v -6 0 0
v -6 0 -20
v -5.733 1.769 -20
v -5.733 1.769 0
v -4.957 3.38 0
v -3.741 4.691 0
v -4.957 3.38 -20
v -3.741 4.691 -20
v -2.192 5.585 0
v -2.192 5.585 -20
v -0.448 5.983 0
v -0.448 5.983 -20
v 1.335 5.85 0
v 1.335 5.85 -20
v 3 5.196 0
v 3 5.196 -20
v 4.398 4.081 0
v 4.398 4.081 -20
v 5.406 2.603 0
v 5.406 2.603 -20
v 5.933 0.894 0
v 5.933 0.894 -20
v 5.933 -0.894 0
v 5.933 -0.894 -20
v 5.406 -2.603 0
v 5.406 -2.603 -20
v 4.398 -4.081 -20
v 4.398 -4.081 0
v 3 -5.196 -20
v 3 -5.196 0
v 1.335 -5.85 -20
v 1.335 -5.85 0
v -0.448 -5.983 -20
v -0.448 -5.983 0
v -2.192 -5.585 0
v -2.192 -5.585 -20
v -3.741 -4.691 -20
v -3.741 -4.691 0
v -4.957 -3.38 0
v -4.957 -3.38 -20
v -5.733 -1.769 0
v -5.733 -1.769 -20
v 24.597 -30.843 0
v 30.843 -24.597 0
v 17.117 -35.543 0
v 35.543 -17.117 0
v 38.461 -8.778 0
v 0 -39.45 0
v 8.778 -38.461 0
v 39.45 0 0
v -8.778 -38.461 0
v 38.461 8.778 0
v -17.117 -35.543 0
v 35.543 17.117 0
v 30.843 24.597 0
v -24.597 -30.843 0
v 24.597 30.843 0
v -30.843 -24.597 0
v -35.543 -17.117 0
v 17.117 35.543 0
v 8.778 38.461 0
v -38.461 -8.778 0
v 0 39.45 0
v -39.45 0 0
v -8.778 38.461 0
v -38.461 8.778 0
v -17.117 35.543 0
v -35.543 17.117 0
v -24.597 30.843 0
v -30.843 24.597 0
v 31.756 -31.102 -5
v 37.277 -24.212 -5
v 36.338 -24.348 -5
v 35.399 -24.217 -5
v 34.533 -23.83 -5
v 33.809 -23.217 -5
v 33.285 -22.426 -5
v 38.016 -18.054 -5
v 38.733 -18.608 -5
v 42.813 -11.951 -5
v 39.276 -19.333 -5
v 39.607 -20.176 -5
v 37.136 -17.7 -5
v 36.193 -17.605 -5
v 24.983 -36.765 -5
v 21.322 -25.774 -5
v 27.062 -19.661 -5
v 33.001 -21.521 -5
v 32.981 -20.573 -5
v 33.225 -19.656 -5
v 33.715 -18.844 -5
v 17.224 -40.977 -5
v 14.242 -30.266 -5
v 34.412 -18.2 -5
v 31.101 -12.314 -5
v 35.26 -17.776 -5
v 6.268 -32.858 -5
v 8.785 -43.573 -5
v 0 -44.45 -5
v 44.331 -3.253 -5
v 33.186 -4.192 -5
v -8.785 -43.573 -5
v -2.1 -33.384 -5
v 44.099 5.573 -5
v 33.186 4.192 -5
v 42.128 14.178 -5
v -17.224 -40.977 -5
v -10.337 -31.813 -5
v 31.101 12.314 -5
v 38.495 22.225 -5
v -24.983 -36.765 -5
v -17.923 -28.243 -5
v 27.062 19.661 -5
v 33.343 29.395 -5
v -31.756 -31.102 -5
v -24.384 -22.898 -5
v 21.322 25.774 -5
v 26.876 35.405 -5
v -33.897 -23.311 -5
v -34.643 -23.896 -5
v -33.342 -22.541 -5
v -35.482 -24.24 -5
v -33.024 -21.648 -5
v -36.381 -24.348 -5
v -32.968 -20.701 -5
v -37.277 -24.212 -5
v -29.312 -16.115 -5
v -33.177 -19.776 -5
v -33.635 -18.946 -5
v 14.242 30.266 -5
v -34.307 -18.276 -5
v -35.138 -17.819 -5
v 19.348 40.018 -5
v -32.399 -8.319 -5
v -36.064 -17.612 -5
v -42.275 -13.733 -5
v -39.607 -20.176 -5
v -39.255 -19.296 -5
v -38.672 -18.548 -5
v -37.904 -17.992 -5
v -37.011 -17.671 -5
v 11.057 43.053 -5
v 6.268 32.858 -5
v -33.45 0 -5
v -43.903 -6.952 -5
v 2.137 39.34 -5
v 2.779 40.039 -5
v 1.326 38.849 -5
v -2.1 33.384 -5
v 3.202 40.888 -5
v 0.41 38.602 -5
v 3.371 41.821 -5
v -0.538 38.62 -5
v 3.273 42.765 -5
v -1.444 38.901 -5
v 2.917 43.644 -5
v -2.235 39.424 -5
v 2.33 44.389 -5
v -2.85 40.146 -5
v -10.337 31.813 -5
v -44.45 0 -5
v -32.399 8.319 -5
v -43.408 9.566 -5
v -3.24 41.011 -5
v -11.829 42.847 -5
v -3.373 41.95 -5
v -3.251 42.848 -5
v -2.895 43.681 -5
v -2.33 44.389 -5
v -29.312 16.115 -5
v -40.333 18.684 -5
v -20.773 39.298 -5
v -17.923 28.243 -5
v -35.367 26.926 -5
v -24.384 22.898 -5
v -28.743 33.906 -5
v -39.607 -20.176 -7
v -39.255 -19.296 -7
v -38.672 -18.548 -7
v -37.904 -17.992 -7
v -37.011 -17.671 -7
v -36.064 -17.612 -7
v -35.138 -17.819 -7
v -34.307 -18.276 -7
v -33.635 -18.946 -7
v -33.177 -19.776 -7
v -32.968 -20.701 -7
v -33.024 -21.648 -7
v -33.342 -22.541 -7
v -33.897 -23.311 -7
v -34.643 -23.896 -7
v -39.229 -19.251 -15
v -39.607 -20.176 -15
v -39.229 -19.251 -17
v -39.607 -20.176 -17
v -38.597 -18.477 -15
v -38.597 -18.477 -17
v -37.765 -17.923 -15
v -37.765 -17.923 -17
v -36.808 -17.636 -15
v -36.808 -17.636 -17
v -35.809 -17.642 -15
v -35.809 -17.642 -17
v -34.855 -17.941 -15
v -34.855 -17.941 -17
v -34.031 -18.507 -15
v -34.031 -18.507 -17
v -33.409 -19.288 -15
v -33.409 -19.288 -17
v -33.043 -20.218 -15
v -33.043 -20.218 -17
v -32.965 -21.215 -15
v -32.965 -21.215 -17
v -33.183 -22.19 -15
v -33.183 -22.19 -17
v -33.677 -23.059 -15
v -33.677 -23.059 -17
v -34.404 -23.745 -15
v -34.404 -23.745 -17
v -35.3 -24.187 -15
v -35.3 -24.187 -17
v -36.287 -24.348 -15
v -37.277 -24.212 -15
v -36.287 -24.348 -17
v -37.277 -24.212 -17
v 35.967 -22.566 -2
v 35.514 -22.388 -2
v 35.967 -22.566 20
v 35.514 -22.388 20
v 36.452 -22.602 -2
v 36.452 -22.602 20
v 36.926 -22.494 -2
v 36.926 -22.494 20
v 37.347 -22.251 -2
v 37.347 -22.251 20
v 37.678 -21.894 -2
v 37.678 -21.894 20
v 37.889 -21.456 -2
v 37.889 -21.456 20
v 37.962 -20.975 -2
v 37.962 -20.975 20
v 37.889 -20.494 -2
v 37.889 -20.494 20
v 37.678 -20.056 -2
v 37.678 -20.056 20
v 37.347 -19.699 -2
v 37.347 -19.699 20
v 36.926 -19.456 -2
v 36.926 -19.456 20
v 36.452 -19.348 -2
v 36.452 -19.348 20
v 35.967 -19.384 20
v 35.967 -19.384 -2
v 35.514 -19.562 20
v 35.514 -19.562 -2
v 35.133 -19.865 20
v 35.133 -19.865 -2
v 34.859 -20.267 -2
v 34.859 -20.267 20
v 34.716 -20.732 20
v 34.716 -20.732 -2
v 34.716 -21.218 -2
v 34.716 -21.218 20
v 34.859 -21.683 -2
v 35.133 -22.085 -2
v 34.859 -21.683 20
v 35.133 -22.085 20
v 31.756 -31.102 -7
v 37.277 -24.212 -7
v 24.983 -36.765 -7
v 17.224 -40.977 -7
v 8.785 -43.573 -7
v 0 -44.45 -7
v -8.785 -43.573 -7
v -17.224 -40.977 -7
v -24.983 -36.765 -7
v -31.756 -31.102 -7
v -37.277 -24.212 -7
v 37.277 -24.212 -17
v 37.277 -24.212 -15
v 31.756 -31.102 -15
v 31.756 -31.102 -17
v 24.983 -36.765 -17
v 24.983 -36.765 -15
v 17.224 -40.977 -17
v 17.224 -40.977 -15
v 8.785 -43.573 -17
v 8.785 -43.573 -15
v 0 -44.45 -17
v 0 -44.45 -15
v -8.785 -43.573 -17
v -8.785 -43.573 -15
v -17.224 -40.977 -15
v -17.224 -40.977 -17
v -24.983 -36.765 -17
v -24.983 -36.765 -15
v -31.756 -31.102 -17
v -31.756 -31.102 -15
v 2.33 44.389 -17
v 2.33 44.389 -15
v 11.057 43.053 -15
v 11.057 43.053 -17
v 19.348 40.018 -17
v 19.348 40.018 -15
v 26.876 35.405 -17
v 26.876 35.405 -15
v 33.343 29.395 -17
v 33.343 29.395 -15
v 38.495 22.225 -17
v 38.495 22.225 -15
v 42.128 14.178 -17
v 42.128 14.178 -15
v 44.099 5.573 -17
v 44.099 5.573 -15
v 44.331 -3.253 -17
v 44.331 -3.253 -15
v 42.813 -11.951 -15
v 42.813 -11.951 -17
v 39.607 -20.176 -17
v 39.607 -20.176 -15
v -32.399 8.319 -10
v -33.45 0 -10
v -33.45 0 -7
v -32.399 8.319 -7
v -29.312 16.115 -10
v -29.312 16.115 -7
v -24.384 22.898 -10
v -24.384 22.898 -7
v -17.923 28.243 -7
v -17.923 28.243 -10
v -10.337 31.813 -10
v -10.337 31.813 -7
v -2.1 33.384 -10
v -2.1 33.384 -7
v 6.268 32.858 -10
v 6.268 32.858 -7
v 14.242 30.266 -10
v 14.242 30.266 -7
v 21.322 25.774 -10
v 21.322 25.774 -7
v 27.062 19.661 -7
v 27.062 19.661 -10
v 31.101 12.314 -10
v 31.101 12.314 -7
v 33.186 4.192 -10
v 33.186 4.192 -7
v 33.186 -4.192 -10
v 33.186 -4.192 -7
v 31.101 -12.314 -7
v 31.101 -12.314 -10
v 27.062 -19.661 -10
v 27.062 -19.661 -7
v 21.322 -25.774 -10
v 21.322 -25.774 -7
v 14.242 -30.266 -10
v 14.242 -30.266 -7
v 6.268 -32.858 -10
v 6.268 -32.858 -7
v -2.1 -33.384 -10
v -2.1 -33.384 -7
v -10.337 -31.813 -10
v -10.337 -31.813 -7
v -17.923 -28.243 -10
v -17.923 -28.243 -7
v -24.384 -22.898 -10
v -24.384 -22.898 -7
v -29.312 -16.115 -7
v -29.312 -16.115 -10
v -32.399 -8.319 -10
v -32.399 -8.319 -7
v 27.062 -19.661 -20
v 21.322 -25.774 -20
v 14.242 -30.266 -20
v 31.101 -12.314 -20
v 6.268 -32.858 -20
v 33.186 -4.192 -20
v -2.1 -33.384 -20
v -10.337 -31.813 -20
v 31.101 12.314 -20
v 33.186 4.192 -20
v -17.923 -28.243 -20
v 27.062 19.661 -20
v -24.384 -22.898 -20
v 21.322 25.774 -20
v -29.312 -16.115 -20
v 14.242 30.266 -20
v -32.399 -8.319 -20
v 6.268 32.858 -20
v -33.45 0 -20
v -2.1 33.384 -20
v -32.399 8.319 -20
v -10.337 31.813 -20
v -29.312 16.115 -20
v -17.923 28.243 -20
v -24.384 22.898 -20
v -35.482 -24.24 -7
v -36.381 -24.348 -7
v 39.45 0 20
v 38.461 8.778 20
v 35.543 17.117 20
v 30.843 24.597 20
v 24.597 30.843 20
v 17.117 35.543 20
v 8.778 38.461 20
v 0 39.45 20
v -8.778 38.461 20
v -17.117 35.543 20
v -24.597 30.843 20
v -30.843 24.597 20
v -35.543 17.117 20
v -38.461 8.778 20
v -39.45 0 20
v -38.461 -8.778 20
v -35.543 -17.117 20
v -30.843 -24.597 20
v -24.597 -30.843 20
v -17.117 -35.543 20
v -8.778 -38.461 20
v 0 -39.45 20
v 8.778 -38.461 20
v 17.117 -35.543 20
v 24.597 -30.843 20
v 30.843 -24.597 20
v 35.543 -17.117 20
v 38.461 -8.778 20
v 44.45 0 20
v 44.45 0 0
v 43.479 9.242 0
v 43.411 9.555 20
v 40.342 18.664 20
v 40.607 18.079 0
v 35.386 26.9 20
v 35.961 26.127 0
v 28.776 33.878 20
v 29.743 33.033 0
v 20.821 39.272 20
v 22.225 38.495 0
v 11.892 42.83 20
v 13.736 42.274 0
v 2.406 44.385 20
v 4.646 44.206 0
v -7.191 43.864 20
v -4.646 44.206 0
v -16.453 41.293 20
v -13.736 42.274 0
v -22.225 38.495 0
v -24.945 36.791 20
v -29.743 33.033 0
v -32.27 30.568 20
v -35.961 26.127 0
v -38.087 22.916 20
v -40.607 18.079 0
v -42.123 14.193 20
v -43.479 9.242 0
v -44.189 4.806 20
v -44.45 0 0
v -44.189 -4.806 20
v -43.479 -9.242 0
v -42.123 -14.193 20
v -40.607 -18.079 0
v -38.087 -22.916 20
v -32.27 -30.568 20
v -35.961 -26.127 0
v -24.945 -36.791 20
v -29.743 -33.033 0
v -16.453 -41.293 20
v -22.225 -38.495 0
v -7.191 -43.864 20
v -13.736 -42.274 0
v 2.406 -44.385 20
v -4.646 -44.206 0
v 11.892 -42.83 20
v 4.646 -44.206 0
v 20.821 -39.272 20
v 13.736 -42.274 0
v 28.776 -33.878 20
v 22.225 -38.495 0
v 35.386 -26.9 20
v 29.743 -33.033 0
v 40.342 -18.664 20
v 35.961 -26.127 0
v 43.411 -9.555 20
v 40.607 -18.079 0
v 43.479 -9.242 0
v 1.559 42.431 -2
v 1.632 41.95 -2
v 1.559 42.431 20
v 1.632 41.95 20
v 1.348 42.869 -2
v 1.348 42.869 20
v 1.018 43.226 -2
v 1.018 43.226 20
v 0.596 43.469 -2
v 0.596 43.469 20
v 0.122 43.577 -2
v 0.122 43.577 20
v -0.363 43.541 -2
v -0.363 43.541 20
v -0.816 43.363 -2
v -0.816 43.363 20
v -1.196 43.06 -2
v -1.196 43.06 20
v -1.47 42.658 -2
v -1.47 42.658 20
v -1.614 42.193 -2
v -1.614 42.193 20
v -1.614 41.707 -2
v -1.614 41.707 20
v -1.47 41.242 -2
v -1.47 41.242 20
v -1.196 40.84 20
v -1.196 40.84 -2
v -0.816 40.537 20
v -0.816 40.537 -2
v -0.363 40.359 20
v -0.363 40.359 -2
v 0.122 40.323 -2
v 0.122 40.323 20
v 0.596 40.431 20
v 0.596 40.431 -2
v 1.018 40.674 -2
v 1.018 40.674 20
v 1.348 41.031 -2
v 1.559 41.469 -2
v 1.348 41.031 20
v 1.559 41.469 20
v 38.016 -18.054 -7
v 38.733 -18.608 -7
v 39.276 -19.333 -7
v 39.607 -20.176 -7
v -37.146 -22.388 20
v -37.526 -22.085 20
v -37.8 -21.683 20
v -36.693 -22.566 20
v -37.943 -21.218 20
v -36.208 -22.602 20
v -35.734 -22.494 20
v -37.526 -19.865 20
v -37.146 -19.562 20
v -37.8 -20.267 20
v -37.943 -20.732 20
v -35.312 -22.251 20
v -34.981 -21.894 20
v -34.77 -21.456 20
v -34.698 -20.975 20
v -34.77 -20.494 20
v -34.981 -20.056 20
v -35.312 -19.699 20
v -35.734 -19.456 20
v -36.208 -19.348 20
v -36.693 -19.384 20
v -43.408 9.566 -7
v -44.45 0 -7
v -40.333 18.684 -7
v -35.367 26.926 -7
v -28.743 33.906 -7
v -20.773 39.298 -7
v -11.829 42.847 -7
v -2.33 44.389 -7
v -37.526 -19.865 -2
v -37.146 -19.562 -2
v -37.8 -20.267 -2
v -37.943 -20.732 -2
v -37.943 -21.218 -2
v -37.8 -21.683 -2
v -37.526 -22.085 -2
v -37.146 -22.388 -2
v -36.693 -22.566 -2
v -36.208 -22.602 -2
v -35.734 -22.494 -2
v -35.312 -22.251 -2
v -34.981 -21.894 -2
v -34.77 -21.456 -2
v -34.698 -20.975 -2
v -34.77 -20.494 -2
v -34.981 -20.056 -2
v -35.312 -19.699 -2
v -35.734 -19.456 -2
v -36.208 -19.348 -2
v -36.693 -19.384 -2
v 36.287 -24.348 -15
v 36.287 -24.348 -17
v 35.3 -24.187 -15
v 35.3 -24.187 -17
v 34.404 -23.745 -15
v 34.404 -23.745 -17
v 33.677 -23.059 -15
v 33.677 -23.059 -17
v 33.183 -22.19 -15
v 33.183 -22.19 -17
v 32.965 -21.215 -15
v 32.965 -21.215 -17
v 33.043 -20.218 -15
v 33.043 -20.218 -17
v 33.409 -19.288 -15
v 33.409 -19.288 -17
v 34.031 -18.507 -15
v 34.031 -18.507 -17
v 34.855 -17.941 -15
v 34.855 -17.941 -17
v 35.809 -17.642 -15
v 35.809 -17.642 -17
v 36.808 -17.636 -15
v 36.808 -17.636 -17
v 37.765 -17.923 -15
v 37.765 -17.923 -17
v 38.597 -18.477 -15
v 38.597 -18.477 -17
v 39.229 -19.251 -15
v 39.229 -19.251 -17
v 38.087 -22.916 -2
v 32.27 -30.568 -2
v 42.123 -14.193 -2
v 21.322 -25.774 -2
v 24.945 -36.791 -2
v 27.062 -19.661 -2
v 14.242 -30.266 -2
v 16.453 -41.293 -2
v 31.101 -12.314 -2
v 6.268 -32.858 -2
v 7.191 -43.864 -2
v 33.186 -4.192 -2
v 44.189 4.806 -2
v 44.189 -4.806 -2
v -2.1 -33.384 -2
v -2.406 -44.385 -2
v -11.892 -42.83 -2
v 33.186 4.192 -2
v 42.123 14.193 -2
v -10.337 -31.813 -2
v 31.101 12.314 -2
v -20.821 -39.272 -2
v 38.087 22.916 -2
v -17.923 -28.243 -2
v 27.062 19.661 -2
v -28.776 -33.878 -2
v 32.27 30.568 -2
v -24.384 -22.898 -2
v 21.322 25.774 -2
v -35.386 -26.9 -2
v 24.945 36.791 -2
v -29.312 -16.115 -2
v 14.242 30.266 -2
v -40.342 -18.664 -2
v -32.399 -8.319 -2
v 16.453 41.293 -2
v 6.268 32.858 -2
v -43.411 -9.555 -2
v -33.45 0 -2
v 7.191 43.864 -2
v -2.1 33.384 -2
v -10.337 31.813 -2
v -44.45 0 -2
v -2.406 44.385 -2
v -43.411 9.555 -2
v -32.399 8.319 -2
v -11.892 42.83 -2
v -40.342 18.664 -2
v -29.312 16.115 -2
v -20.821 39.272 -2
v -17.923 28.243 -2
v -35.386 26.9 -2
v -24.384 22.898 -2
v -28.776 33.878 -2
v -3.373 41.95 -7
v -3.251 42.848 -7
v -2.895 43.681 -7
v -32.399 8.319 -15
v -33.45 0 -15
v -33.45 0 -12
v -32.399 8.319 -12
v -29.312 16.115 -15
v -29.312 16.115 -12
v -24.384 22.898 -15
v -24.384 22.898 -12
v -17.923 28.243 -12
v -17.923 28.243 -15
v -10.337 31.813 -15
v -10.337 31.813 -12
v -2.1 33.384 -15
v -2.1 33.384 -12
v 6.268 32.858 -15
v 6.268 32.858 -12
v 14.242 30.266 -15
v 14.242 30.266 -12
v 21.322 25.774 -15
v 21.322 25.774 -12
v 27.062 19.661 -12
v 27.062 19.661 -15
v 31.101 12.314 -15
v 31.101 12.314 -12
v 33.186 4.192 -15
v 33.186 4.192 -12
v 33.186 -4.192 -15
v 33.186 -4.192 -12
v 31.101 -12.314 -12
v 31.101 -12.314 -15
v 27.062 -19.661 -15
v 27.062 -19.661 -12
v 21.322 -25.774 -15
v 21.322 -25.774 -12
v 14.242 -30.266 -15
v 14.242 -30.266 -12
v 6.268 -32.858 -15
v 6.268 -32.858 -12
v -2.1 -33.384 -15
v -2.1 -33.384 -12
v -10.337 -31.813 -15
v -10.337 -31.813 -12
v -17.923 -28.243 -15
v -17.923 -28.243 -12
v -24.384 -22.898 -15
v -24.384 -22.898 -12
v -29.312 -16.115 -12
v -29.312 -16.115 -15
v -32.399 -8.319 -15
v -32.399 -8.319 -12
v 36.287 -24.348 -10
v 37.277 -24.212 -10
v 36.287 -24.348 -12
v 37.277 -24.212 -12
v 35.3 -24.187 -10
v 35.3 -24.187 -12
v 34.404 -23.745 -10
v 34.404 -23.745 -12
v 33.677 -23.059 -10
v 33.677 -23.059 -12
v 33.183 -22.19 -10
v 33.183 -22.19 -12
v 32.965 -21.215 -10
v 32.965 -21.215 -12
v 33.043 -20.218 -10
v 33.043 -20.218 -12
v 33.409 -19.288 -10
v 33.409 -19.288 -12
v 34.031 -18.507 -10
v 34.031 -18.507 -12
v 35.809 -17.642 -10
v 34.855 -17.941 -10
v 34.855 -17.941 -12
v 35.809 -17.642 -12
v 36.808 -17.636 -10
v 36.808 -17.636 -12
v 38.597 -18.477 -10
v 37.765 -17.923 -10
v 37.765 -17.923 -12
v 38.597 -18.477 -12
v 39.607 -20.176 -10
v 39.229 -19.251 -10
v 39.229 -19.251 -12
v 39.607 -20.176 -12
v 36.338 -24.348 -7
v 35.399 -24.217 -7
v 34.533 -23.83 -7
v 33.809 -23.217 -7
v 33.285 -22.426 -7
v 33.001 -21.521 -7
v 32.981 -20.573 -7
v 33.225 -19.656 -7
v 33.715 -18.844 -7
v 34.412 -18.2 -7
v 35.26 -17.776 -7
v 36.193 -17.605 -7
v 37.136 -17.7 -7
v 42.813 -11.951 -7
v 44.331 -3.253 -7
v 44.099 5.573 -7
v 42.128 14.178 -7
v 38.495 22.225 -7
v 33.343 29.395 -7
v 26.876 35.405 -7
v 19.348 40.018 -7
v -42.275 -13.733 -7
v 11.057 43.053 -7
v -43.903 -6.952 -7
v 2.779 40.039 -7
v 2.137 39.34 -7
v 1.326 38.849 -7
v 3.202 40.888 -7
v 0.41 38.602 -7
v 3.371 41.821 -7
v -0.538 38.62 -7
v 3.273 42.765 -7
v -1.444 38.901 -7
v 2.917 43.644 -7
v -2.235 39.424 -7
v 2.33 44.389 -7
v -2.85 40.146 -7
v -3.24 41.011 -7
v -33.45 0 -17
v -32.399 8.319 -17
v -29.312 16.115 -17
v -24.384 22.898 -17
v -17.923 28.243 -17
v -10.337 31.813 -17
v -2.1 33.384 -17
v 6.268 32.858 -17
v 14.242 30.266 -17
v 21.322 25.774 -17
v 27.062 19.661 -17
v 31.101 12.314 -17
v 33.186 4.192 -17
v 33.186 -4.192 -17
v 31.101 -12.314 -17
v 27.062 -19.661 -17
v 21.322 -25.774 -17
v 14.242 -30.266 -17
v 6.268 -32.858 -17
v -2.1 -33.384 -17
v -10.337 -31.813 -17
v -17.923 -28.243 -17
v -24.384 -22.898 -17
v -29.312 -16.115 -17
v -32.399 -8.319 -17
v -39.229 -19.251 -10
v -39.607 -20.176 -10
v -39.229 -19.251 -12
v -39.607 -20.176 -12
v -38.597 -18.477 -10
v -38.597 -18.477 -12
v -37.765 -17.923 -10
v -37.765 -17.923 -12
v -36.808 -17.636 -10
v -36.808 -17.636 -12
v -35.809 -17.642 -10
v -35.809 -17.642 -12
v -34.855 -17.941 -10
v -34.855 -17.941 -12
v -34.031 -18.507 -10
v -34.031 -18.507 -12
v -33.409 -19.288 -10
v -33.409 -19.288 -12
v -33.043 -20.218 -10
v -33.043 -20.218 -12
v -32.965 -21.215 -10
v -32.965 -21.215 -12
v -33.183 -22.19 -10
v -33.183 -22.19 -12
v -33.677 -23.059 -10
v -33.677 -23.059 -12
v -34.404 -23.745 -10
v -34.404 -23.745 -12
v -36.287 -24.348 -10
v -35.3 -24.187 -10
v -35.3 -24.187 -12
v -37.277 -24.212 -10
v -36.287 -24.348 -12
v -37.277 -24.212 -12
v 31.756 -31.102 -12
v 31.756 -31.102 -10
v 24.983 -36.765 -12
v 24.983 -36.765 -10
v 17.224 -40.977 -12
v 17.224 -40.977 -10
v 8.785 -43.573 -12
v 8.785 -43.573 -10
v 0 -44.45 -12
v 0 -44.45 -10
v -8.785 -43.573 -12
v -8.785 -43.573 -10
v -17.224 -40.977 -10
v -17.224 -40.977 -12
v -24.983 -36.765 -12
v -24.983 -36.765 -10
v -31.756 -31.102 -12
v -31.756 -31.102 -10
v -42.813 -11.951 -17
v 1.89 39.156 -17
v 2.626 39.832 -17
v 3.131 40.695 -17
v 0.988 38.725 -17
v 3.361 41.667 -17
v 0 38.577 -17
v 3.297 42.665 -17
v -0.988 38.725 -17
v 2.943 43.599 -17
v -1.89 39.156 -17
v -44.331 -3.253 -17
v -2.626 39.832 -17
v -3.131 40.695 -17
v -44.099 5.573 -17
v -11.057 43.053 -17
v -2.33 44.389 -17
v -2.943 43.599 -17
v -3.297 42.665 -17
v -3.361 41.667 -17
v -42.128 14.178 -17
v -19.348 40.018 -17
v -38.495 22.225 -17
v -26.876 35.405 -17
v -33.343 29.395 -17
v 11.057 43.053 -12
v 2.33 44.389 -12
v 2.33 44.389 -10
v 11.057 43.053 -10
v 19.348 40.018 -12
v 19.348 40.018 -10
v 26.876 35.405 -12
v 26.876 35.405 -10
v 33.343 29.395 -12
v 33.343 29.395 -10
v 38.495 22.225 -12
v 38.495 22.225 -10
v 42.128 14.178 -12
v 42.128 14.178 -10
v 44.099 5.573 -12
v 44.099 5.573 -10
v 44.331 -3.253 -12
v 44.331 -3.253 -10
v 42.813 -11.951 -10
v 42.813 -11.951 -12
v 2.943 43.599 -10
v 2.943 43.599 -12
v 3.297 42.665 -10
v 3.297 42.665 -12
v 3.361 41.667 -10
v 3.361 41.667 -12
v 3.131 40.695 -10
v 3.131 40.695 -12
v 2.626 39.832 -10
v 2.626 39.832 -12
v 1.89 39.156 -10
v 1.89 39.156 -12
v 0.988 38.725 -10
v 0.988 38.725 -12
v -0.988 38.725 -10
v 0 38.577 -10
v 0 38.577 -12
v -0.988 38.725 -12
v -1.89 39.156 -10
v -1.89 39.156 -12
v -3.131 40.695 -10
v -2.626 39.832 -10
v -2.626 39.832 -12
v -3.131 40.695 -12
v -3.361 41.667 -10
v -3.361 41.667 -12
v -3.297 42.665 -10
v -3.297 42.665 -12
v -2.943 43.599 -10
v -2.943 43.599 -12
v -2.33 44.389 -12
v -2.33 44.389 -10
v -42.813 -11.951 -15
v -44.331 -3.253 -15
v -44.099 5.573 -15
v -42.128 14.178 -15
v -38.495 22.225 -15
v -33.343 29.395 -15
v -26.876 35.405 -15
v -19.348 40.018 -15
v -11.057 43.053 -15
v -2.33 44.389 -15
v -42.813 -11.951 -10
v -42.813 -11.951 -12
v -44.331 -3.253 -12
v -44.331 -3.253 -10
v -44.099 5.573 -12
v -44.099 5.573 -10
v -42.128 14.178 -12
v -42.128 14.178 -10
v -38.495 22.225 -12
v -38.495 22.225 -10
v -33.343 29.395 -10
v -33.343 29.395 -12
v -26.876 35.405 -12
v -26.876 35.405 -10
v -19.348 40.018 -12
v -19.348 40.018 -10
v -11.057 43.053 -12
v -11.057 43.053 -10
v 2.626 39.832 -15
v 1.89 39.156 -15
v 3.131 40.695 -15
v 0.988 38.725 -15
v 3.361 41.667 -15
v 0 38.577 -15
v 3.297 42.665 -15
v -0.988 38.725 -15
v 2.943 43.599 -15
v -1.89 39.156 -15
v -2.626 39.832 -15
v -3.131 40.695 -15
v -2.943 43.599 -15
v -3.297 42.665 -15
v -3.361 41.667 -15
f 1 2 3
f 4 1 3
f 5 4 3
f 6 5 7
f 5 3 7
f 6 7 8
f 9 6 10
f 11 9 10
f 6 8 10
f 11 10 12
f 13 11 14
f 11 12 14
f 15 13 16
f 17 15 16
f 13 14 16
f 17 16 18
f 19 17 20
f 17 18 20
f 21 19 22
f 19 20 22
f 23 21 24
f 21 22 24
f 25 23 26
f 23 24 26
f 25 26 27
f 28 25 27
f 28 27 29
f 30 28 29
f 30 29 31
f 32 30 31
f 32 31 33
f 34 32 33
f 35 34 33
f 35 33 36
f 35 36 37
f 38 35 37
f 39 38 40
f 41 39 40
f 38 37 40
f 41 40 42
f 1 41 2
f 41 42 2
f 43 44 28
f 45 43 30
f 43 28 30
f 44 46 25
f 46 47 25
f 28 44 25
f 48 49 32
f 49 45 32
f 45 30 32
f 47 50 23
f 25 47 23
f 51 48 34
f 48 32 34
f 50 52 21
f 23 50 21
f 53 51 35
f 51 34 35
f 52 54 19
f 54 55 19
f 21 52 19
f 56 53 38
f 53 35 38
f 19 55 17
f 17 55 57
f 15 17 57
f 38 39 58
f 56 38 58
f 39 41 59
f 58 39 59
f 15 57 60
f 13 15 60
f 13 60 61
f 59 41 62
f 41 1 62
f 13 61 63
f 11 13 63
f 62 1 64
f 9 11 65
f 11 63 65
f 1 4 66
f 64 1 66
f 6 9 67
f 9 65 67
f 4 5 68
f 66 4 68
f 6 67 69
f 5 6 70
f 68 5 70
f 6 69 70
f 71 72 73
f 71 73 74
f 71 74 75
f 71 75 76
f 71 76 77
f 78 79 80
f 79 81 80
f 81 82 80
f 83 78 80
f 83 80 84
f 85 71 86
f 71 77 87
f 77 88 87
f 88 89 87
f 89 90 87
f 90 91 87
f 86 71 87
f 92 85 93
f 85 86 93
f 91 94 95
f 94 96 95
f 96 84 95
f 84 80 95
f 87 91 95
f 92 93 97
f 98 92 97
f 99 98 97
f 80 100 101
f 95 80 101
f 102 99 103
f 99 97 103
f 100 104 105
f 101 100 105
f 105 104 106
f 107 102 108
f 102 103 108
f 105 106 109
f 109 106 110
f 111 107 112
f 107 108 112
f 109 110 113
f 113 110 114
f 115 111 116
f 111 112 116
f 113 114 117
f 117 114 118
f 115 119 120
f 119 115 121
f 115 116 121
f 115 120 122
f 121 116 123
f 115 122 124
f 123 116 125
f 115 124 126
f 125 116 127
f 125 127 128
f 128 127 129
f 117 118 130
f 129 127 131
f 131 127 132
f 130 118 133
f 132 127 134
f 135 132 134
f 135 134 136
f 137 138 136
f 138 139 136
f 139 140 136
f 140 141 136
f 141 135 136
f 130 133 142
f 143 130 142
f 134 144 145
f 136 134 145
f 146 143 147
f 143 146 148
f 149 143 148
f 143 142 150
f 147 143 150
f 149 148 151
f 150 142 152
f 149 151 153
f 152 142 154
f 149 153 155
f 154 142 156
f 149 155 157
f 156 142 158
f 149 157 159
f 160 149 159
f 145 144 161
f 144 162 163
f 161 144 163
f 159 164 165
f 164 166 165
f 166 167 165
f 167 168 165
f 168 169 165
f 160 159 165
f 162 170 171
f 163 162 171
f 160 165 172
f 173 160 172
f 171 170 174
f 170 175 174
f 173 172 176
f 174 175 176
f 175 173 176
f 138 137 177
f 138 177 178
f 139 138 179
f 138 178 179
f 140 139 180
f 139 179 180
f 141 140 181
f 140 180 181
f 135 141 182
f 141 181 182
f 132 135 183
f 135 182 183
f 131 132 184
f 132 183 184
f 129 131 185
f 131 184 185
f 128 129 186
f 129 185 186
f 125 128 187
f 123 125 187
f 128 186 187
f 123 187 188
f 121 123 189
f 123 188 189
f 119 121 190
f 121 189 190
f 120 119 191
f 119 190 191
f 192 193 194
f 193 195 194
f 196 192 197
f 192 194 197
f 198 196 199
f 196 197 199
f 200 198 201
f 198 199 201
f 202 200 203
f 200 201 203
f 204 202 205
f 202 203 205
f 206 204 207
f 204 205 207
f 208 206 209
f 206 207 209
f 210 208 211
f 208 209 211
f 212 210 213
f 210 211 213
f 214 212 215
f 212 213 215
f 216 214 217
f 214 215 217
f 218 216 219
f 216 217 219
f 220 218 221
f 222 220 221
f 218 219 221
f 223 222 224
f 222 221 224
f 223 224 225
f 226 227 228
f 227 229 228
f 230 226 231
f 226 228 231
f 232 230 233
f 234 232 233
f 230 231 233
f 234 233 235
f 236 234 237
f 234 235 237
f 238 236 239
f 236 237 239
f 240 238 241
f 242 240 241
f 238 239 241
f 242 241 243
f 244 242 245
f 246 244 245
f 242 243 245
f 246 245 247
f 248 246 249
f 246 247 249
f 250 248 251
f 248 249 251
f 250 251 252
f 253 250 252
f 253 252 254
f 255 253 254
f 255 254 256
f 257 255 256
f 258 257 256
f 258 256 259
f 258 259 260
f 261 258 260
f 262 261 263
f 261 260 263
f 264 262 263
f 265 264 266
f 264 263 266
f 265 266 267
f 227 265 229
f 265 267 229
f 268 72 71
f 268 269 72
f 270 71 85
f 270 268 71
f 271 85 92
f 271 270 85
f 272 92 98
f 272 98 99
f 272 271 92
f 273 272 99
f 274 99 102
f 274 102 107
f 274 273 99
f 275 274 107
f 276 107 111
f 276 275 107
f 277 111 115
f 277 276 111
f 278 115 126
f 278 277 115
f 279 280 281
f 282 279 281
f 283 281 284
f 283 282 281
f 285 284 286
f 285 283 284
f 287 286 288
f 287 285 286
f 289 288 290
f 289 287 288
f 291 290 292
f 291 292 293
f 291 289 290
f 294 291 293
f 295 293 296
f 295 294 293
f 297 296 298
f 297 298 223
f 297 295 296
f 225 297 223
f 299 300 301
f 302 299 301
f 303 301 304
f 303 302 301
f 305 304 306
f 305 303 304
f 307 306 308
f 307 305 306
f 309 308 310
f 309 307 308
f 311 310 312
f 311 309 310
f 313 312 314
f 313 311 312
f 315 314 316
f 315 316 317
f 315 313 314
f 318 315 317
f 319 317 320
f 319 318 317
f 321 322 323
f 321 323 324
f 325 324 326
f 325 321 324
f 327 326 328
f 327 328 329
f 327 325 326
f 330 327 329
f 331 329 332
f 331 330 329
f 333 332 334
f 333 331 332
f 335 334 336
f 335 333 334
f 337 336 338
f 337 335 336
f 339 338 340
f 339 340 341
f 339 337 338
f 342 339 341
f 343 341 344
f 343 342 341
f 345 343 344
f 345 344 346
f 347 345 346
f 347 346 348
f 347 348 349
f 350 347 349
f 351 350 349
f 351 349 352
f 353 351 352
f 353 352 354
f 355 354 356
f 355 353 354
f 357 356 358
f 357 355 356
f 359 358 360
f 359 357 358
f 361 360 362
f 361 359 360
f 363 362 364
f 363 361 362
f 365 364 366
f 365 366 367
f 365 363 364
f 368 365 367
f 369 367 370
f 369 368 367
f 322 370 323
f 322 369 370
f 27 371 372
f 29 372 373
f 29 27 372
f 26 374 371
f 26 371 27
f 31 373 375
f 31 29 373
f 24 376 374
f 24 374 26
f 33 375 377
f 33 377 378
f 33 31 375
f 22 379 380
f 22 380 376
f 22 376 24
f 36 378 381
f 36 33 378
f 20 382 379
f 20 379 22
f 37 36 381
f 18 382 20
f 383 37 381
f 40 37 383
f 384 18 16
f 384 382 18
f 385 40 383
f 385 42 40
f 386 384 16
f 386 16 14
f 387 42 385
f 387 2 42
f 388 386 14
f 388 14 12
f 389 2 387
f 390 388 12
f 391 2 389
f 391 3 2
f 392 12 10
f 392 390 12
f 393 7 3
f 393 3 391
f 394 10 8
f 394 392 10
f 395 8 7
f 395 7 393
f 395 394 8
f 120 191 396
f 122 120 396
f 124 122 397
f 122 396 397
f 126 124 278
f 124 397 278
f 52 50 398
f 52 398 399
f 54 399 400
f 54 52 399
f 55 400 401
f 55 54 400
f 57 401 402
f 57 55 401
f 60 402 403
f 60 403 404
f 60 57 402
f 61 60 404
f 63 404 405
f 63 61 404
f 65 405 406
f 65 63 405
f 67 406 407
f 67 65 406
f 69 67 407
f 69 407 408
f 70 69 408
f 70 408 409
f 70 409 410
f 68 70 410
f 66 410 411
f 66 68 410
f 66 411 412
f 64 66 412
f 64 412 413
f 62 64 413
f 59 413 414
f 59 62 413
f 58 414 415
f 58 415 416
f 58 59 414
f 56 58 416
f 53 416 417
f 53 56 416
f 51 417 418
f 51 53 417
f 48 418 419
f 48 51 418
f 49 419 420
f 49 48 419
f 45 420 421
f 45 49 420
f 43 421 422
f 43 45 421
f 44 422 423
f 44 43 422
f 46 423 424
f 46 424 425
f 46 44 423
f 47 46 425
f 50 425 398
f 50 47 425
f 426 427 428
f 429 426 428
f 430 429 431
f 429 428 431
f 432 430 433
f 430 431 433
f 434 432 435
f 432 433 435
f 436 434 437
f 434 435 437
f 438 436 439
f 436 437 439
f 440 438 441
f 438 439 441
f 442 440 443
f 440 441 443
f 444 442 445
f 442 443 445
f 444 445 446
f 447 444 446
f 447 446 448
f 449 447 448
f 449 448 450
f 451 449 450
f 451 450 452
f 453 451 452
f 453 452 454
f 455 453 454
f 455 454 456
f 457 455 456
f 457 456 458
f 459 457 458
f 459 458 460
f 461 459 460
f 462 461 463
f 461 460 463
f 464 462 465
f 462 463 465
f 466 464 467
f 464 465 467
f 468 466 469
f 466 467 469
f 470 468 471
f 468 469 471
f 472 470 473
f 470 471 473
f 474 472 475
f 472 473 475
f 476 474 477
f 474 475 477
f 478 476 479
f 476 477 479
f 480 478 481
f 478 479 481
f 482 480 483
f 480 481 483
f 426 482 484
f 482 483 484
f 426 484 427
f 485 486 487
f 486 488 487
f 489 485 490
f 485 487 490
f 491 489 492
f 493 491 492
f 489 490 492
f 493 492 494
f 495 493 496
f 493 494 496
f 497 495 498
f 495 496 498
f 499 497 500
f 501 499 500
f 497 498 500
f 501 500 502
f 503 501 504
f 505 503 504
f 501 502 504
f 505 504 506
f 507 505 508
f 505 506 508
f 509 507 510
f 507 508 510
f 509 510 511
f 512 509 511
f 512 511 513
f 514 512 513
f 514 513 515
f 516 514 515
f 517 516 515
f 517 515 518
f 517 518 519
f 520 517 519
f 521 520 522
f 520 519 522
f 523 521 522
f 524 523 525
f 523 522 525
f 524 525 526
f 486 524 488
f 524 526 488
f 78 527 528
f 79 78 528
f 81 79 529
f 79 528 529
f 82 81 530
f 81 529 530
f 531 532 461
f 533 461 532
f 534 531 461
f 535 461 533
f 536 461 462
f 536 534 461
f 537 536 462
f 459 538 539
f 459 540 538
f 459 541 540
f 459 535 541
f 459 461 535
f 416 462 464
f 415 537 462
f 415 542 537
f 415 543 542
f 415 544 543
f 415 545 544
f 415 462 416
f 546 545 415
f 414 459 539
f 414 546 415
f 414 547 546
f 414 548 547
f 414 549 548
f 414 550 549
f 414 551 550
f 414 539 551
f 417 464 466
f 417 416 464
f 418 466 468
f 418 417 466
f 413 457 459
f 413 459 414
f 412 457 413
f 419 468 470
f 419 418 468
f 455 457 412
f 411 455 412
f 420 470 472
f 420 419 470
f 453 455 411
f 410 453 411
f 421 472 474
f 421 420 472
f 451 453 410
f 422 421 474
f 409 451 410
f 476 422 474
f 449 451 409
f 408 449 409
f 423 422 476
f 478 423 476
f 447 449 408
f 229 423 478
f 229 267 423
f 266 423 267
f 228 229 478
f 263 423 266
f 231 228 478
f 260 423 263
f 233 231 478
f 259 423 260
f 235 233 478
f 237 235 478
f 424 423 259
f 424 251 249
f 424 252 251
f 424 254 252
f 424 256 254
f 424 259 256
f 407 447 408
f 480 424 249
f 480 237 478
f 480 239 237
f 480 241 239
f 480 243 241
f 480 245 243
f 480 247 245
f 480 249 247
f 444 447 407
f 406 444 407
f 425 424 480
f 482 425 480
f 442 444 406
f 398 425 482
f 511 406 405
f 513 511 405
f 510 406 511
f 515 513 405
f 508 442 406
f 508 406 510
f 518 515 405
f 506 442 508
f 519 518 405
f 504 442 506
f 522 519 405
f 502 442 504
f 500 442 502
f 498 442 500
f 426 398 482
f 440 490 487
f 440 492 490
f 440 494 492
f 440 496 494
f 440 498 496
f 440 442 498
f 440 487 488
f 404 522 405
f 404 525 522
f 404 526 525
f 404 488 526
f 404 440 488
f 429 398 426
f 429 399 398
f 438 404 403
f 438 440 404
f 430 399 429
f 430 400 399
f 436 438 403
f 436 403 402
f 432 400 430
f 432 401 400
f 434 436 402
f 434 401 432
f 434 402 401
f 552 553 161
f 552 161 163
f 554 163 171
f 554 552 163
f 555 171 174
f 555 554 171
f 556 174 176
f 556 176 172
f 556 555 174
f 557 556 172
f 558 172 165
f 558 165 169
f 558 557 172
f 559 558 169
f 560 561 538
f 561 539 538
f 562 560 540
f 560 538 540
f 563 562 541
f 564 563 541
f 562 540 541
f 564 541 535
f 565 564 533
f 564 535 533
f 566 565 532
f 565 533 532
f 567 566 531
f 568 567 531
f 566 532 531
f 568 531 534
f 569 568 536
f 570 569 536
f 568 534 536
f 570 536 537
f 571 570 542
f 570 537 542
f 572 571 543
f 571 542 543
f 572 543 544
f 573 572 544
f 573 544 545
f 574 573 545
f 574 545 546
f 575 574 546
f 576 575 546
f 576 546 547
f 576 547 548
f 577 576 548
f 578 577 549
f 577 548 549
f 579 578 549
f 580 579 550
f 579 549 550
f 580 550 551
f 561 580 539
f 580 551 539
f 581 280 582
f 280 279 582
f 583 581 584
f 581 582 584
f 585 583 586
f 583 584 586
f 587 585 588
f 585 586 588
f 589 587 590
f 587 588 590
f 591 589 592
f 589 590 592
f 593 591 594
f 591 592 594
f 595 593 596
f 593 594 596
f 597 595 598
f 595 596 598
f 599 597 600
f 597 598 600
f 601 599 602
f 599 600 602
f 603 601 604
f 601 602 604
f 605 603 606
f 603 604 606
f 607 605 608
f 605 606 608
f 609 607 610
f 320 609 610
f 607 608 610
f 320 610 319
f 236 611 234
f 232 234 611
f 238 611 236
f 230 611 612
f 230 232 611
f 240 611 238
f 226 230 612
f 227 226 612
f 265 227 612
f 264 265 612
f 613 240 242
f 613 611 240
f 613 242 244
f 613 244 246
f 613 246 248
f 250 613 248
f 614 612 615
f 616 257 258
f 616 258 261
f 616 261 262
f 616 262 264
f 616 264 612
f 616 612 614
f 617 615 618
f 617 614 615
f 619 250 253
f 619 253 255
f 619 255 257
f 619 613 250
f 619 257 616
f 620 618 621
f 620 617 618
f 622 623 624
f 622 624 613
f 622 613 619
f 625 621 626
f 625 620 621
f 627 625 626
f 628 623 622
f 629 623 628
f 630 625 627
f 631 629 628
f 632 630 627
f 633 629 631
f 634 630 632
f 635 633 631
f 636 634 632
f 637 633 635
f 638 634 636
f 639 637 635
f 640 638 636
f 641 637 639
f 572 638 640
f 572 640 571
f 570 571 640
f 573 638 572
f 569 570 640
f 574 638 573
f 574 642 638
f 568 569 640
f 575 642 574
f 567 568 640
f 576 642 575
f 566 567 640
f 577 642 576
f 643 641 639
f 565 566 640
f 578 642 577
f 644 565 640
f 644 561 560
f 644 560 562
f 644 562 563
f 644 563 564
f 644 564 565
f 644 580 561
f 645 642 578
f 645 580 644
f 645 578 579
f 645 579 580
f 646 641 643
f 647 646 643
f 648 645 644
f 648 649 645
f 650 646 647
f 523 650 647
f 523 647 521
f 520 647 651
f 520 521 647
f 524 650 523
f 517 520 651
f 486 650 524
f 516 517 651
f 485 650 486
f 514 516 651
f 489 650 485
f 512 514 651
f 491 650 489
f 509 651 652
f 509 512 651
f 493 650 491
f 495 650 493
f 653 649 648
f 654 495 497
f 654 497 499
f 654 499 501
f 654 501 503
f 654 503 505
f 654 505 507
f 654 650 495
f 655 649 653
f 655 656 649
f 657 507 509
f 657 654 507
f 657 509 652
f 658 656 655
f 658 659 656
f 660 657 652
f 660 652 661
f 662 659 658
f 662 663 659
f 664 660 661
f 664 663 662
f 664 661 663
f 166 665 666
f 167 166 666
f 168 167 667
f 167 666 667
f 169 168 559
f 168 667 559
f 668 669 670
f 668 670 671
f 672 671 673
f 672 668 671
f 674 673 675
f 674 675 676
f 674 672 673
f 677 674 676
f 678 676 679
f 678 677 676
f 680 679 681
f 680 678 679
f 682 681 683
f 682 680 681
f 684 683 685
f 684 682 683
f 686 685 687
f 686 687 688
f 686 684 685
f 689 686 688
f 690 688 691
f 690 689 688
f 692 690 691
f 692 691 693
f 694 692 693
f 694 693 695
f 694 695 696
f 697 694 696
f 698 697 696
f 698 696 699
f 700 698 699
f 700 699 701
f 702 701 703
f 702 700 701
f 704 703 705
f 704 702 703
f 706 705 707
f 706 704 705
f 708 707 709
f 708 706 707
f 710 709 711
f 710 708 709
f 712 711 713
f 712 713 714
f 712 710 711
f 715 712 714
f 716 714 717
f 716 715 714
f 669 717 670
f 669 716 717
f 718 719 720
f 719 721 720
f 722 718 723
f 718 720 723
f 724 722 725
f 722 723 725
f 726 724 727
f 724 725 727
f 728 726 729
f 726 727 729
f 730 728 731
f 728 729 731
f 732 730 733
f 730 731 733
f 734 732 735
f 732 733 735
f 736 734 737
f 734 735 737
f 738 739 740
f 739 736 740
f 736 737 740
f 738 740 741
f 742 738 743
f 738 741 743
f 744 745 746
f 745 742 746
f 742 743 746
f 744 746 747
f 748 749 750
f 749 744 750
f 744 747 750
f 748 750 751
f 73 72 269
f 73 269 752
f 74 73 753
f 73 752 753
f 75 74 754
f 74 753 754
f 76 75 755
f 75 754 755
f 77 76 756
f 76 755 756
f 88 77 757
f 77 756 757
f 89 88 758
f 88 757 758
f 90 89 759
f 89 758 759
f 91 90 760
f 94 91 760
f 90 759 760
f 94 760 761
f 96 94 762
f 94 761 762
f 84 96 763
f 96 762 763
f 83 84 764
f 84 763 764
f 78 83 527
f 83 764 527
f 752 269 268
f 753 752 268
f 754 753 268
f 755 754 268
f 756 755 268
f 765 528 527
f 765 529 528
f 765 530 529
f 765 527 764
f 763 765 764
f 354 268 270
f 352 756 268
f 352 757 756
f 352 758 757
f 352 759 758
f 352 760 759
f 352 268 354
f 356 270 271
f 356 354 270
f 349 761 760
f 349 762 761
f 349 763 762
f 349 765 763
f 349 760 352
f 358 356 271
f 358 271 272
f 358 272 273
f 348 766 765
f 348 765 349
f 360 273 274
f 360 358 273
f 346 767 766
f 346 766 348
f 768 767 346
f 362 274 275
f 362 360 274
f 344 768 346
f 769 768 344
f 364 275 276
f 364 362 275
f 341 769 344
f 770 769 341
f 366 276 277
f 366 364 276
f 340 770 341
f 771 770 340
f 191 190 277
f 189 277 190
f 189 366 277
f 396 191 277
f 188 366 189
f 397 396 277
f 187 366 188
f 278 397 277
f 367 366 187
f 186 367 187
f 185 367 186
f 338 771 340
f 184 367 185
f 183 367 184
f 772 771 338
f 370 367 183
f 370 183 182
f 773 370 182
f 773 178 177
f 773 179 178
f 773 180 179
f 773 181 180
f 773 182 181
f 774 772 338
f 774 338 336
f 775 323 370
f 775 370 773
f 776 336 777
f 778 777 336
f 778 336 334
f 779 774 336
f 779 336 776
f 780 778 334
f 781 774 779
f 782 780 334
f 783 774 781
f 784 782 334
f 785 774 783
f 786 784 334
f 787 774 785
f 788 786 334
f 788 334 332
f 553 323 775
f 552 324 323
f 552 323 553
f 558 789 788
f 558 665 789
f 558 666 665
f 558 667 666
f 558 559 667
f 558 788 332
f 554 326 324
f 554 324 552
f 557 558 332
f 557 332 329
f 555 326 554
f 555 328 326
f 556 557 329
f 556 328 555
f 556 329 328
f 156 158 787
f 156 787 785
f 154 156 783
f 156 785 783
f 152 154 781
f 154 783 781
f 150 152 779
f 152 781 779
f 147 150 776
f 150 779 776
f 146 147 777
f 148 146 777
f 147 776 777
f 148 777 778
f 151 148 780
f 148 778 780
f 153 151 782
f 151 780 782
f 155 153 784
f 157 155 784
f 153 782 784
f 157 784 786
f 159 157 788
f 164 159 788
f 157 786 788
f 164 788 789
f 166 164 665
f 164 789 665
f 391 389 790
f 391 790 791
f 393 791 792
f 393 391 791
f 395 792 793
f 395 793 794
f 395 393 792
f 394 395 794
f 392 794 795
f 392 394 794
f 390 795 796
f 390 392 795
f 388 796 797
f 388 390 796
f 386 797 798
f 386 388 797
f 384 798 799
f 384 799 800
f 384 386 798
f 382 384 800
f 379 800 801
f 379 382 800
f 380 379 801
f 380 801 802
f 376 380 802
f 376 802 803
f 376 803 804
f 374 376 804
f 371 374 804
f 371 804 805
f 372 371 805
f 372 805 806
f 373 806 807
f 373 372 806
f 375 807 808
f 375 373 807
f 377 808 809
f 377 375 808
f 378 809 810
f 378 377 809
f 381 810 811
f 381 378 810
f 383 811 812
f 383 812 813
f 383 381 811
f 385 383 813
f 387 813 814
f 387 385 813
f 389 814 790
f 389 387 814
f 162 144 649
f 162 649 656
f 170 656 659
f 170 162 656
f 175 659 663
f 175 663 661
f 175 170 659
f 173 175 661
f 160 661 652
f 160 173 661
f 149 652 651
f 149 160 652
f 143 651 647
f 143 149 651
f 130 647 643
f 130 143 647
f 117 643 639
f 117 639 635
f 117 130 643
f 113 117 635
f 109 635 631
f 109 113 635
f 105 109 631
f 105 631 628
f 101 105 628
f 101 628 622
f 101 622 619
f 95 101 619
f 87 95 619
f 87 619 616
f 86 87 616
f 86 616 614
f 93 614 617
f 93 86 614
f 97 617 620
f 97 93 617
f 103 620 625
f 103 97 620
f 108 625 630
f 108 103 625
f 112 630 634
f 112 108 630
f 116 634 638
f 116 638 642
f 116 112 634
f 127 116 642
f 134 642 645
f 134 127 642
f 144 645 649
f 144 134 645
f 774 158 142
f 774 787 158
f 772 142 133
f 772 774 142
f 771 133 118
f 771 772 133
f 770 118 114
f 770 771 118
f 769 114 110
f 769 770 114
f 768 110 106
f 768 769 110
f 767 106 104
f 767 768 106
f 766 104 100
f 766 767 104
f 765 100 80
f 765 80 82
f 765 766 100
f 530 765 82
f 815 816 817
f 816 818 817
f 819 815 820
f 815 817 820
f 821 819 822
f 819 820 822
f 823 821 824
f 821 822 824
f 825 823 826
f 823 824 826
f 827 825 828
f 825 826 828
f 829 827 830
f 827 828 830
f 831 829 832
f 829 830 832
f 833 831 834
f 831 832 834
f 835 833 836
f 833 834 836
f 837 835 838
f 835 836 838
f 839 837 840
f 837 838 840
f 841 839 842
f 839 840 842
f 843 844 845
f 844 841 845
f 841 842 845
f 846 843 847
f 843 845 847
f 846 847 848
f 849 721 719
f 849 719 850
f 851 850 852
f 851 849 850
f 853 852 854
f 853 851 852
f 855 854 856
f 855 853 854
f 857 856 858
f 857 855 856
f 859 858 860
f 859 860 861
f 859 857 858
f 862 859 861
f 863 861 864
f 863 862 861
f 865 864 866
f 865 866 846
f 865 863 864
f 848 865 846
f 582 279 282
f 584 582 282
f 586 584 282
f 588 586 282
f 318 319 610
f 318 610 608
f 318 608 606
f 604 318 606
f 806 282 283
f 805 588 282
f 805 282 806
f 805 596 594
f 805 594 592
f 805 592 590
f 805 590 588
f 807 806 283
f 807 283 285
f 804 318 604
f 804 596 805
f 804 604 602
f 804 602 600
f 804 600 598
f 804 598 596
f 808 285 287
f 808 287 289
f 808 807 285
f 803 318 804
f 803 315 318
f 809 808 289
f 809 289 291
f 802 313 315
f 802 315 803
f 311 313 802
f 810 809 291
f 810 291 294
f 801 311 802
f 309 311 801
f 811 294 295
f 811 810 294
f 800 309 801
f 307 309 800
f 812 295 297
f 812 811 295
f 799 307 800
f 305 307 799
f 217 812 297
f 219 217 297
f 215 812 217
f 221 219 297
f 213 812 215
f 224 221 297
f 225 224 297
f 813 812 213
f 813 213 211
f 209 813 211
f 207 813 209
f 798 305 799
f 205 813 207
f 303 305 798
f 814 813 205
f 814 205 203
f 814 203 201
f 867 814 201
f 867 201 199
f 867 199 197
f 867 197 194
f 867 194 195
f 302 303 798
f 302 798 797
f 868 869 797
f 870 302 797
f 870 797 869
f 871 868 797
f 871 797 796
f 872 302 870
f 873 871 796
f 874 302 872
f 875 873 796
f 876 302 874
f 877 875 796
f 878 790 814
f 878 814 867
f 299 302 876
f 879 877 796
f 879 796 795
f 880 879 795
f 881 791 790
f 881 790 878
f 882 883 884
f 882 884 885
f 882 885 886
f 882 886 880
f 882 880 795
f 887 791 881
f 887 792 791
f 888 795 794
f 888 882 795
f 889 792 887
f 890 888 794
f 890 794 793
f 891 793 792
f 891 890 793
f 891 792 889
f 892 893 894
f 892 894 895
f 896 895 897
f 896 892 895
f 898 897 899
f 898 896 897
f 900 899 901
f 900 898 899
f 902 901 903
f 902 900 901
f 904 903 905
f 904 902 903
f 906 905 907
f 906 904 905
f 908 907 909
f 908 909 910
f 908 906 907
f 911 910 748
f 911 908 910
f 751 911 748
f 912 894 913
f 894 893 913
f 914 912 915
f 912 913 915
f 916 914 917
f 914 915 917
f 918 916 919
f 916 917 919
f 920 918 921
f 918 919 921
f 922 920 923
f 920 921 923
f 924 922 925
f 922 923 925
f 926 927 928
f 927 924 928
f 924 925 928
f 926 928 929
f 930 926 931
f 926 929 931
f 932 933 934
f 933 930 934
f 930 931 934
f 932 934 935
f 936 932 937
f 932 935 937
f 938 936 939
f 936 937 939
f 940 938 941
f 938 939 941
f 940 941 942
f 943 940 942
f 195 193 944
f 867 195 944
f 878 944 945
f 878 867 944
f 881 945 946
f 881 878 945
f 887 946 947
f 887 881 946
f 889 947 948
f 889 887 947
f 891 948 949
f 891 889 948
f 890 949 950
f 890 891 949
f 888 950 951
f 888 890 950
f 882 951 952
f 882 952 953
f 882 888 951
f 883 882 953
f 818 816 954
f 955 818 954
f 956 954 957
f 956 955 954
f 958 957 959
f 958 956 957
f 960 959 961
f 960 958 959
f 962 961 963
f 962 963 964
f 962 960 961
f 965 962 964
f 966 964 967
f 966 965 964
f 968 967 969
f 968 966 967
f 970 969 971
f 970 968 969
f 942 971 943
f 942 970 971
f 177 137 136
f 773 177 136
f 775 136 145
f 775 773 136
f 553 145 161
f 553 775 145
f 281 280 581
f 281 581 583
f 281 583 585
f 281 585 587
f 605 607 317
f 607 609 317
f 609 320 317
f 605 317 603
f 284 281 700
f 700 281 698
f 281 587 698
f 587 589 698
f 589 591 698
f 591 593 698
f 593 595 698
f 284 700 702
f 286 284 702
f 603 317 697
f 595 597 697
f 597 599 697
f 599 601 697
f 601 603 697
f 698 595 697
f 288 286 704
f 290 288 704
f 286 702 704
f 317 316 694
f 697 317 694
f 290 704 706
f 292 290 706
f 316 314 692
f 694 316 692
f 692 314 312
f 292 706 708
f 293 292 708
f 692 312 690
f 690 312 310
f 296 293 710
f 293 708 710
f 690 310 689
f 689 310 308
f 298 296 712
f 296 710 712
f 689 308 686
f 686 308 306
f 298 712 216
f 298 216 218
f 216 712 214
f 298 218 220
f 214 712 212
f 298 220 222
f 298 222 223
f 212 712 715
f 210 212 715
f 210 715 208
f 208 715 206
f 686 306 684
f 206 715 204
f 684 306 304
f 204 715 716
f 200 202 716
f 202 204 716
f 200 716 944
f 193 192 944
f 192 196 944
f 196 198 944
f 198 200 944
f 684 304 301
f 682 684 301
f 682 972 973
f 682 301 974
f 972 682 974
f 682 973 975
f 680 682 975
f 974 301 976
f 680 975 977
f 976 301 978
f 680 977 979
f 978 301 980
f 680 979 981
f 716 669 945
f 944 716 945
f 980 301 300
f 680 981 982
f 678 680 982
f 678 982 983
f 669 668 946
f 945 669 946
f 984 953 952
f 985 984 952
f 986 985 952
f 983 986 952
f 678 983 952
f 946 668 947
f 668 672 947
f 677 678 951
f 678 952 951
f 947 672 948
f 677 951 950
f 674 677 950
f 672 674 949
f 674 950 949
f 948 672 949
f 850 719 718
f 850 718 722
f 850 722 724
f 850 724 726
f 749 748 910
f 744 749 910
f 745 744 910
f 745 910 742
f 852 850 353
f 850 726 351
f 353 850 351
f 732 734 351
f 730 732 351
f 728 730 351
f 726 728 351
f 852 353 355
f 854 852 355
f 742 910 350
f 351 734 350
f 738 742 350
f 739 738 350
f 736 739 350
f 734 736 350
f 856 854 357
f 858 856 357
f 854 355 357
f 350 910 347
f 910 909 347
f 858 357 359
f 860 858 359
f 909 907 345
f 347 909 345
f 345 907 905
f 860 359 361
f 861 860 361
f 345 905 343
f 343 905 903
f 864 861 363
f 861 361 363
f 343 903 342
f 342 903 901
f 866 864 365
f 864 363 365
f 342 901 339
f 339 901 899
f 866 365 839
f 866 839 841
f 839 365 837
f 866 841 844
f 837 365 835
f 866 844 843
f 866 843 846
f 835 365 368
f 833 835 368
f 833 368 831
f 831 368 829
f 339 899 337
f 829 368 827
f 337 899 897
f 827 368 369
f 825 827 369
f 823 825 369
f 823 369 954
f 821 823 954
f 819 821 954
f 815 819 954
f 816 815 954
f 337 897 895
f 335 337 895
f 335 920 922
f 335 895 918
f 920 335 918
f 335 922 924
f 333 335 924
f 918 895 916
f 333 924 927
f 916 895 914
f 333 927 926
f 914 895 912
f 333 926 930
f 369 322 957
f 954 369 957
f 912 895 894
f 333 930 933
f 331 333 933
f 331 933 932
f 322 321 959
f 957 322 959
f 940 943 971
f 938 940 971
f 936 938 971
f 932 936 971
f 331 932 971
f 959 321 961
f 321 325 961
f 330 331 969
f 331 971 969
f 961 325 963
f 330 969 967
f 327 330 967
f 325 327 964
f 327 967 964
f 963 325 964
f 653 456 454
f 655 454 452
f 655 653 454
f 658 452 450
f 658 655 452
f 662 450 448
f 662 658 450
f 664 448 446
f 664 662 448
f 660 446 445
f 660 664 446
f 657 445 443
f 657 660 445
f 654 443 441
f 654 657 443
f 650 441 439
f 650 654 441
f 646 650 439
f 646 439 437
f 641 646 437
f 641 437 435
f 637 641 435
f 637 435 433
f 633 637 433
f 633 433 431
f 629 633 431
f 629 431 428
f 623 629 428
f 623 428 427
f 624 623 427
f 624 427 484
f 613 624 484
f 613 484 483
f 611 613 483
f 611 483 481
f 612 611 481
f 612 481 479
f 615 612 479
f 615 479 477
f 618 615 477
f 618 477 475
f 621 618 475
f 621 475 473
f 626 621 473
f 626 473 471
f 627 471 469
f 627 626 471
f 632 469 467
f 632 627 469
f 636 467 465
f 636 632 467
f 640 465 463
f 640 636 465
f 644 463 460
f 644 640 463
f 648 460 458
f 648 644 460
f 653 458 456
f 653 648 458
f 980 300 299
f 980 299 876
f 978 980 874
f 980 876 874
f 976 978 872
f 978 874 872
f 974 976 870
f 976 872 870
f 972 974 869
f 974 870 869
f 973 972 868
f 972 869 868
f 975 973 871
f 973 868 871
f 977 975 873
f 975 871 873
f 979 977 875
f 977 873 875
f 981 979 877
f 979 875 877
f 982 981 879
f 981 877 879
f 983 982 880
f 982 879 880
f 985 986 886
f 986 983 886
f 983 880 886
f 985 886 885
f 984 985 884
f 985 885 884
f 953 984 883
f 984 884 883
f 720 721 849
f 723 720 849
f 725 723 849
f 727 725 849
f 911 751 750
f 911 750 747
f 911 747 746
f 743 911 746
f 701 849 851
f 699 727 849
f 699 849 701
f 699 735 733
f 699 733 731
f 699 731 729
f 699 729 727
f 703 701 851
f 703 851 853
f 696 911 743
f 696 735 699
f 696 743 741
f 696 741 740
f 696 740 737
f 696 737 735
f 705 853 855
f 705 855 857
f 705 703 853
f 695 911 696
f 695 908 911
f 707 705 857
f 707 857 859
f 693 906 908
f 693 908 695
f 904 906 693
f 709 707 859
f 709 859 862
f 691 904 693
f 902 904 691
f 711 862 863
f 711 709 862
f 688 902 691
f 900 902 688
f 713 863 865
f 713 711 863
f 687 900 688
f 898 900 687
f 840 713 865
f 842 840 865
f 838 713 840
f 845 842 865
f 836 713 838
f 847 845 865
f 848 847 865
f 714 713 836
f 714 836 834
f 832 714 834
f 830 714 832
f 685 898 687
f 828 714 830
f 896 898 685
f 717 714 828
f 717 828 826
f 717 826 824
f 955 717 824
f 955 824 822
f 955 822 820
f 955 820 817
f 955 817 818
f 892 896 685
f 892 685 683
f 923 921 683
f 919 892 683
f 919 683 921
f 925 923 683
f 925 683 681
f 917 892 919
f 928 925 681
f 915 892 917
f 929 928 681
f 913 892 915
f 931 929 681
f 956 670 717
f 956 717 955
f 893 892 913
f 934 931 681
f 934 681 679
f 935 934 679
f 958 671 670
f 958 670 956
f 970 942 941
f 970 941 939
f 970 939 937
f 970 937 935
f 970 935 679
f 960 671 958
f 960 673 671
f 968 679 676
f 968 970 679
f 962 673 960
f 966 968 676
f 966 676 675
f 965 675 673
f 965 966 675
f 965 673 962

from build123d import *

# Parameters (mm, degrees)
SKETCH1_R                                           = 44.45
SKETCH1_R_2                                         = 39.45
BOSS_EXTRUDE1_DEPTH                                 = 20
BOSS_EXTRUDE2_START                                 = 20
SKETCH4_R                                           = 44.45
SKETCH4_R_2                                         = 6
BOSS_EXTRUDE2_DEPTH                                 = 20
SKETCH5_R                                           = 44.45
SKETCH5_R_2                                         = 33.45
CUT_EXTRUDE1_DEPTH                                  = 3
LPATTERN1_COUNT                                     = 4
LPATTERN1_PITCH                                     = 5
CBORE_FOR_4_BINDING_HEAD_MACHINE_SCREW3_D           = 3.2639
CBORE_FOR_4_BINDING_HEAD_MACHINE_SCREW3_CBORE_D     = 6.74624
CBORE_FOR_4_BINDING_HEAD_MACHINE_SCREW3_CBORE_DEPTH = 14.4272
CIRPATTERN2_COUNT                                   = 3


with BuildPart() as part:
    # Sketch1 → Boss-Extrude1 (new body)
    with BuildSketch(Plane.XY):
        Circle(SKETCH1_R)
        Circle(SKETCH1_R_2, mode=Mode.SUBTRACT)
    extrude(amount=BOSS_EXTRUDE1_DEPTH)

    # Sketch4 → Boss-Extrude2 (add)
    with BuildSketch(Plane(origin=(0, 0, 0), x_dir=(-1, 0, 0), z_dir=(0, 0, -1)).offset(BOSS_EXTRUDE2_START)):
        Circle(SKETCH4_R)
        Circle(SKETCH4_R_2, mode=Mode.SUBTRACT)
    extrude(amount=-BOSS_EXTRUDE2_DEPTH)

    # Sketch5 → Cut-Extrude1 (cut)
    with BuildSketch(Plane(origin=(0, 0, -20), x_dir=(-1, 0, 0), z_dir=(0, 0, -1))):
        Circle(SKETCH5_R)
        Circle(SKETCH5_R_2, mode=Mode.SUBTRACT)
    cut_extrude1 = extrude(amount=-CUT_EXTRUDE1_DEPTH, mode=Mode.SUBTRACT)

    # LPattern1: Cut-Extrude1 ×4
    with Locations(*[(0, 0, i * LPATTERN1_PITCH) for i in range(1, LPATTERN1_COUNT)]):
        add(cut_extrude1, mode=Mode.SUBTRACT)

    # CBORE for #4 Binding Head Machine Screw3 (through all)
    with Locations(Plane(origin=(0, 0, -17), x_dir=(-1, 0, 0), z_dir=(0, 0, -1))):
        with Locations((0, 41.95)):
            cbore_for_4_binding_head_machine_screw3 = CounterBoreHole(CBORE_FOR_4_BINDING_HEAD_MACHINE_SCREW3_D / 2, CBORE_FOR_4_BINDING_HEAD_MACHINE_SCREW3_CBORE_D / 2, CBORE_FOR_4_BINDING_HEAD_MACHINE_SCREW3_CBORE_DEPTH)

    # CirPattern2: CBORE for #4 Binding Head Machine Screw3 ×3 about axis
    cirpattern2_axis = Axis((0, 0, 0), (0, 0, 1))
    for i in range(1, CIRPATTERN2_COUNT):
        add(cbore_for_4_binding_head_machine_screw3.rotate(cirpattern2_axis, i * 360 / CIRPATTERN2_COUNT), mode=Mode.SUBTRACT)


solid = part.part
